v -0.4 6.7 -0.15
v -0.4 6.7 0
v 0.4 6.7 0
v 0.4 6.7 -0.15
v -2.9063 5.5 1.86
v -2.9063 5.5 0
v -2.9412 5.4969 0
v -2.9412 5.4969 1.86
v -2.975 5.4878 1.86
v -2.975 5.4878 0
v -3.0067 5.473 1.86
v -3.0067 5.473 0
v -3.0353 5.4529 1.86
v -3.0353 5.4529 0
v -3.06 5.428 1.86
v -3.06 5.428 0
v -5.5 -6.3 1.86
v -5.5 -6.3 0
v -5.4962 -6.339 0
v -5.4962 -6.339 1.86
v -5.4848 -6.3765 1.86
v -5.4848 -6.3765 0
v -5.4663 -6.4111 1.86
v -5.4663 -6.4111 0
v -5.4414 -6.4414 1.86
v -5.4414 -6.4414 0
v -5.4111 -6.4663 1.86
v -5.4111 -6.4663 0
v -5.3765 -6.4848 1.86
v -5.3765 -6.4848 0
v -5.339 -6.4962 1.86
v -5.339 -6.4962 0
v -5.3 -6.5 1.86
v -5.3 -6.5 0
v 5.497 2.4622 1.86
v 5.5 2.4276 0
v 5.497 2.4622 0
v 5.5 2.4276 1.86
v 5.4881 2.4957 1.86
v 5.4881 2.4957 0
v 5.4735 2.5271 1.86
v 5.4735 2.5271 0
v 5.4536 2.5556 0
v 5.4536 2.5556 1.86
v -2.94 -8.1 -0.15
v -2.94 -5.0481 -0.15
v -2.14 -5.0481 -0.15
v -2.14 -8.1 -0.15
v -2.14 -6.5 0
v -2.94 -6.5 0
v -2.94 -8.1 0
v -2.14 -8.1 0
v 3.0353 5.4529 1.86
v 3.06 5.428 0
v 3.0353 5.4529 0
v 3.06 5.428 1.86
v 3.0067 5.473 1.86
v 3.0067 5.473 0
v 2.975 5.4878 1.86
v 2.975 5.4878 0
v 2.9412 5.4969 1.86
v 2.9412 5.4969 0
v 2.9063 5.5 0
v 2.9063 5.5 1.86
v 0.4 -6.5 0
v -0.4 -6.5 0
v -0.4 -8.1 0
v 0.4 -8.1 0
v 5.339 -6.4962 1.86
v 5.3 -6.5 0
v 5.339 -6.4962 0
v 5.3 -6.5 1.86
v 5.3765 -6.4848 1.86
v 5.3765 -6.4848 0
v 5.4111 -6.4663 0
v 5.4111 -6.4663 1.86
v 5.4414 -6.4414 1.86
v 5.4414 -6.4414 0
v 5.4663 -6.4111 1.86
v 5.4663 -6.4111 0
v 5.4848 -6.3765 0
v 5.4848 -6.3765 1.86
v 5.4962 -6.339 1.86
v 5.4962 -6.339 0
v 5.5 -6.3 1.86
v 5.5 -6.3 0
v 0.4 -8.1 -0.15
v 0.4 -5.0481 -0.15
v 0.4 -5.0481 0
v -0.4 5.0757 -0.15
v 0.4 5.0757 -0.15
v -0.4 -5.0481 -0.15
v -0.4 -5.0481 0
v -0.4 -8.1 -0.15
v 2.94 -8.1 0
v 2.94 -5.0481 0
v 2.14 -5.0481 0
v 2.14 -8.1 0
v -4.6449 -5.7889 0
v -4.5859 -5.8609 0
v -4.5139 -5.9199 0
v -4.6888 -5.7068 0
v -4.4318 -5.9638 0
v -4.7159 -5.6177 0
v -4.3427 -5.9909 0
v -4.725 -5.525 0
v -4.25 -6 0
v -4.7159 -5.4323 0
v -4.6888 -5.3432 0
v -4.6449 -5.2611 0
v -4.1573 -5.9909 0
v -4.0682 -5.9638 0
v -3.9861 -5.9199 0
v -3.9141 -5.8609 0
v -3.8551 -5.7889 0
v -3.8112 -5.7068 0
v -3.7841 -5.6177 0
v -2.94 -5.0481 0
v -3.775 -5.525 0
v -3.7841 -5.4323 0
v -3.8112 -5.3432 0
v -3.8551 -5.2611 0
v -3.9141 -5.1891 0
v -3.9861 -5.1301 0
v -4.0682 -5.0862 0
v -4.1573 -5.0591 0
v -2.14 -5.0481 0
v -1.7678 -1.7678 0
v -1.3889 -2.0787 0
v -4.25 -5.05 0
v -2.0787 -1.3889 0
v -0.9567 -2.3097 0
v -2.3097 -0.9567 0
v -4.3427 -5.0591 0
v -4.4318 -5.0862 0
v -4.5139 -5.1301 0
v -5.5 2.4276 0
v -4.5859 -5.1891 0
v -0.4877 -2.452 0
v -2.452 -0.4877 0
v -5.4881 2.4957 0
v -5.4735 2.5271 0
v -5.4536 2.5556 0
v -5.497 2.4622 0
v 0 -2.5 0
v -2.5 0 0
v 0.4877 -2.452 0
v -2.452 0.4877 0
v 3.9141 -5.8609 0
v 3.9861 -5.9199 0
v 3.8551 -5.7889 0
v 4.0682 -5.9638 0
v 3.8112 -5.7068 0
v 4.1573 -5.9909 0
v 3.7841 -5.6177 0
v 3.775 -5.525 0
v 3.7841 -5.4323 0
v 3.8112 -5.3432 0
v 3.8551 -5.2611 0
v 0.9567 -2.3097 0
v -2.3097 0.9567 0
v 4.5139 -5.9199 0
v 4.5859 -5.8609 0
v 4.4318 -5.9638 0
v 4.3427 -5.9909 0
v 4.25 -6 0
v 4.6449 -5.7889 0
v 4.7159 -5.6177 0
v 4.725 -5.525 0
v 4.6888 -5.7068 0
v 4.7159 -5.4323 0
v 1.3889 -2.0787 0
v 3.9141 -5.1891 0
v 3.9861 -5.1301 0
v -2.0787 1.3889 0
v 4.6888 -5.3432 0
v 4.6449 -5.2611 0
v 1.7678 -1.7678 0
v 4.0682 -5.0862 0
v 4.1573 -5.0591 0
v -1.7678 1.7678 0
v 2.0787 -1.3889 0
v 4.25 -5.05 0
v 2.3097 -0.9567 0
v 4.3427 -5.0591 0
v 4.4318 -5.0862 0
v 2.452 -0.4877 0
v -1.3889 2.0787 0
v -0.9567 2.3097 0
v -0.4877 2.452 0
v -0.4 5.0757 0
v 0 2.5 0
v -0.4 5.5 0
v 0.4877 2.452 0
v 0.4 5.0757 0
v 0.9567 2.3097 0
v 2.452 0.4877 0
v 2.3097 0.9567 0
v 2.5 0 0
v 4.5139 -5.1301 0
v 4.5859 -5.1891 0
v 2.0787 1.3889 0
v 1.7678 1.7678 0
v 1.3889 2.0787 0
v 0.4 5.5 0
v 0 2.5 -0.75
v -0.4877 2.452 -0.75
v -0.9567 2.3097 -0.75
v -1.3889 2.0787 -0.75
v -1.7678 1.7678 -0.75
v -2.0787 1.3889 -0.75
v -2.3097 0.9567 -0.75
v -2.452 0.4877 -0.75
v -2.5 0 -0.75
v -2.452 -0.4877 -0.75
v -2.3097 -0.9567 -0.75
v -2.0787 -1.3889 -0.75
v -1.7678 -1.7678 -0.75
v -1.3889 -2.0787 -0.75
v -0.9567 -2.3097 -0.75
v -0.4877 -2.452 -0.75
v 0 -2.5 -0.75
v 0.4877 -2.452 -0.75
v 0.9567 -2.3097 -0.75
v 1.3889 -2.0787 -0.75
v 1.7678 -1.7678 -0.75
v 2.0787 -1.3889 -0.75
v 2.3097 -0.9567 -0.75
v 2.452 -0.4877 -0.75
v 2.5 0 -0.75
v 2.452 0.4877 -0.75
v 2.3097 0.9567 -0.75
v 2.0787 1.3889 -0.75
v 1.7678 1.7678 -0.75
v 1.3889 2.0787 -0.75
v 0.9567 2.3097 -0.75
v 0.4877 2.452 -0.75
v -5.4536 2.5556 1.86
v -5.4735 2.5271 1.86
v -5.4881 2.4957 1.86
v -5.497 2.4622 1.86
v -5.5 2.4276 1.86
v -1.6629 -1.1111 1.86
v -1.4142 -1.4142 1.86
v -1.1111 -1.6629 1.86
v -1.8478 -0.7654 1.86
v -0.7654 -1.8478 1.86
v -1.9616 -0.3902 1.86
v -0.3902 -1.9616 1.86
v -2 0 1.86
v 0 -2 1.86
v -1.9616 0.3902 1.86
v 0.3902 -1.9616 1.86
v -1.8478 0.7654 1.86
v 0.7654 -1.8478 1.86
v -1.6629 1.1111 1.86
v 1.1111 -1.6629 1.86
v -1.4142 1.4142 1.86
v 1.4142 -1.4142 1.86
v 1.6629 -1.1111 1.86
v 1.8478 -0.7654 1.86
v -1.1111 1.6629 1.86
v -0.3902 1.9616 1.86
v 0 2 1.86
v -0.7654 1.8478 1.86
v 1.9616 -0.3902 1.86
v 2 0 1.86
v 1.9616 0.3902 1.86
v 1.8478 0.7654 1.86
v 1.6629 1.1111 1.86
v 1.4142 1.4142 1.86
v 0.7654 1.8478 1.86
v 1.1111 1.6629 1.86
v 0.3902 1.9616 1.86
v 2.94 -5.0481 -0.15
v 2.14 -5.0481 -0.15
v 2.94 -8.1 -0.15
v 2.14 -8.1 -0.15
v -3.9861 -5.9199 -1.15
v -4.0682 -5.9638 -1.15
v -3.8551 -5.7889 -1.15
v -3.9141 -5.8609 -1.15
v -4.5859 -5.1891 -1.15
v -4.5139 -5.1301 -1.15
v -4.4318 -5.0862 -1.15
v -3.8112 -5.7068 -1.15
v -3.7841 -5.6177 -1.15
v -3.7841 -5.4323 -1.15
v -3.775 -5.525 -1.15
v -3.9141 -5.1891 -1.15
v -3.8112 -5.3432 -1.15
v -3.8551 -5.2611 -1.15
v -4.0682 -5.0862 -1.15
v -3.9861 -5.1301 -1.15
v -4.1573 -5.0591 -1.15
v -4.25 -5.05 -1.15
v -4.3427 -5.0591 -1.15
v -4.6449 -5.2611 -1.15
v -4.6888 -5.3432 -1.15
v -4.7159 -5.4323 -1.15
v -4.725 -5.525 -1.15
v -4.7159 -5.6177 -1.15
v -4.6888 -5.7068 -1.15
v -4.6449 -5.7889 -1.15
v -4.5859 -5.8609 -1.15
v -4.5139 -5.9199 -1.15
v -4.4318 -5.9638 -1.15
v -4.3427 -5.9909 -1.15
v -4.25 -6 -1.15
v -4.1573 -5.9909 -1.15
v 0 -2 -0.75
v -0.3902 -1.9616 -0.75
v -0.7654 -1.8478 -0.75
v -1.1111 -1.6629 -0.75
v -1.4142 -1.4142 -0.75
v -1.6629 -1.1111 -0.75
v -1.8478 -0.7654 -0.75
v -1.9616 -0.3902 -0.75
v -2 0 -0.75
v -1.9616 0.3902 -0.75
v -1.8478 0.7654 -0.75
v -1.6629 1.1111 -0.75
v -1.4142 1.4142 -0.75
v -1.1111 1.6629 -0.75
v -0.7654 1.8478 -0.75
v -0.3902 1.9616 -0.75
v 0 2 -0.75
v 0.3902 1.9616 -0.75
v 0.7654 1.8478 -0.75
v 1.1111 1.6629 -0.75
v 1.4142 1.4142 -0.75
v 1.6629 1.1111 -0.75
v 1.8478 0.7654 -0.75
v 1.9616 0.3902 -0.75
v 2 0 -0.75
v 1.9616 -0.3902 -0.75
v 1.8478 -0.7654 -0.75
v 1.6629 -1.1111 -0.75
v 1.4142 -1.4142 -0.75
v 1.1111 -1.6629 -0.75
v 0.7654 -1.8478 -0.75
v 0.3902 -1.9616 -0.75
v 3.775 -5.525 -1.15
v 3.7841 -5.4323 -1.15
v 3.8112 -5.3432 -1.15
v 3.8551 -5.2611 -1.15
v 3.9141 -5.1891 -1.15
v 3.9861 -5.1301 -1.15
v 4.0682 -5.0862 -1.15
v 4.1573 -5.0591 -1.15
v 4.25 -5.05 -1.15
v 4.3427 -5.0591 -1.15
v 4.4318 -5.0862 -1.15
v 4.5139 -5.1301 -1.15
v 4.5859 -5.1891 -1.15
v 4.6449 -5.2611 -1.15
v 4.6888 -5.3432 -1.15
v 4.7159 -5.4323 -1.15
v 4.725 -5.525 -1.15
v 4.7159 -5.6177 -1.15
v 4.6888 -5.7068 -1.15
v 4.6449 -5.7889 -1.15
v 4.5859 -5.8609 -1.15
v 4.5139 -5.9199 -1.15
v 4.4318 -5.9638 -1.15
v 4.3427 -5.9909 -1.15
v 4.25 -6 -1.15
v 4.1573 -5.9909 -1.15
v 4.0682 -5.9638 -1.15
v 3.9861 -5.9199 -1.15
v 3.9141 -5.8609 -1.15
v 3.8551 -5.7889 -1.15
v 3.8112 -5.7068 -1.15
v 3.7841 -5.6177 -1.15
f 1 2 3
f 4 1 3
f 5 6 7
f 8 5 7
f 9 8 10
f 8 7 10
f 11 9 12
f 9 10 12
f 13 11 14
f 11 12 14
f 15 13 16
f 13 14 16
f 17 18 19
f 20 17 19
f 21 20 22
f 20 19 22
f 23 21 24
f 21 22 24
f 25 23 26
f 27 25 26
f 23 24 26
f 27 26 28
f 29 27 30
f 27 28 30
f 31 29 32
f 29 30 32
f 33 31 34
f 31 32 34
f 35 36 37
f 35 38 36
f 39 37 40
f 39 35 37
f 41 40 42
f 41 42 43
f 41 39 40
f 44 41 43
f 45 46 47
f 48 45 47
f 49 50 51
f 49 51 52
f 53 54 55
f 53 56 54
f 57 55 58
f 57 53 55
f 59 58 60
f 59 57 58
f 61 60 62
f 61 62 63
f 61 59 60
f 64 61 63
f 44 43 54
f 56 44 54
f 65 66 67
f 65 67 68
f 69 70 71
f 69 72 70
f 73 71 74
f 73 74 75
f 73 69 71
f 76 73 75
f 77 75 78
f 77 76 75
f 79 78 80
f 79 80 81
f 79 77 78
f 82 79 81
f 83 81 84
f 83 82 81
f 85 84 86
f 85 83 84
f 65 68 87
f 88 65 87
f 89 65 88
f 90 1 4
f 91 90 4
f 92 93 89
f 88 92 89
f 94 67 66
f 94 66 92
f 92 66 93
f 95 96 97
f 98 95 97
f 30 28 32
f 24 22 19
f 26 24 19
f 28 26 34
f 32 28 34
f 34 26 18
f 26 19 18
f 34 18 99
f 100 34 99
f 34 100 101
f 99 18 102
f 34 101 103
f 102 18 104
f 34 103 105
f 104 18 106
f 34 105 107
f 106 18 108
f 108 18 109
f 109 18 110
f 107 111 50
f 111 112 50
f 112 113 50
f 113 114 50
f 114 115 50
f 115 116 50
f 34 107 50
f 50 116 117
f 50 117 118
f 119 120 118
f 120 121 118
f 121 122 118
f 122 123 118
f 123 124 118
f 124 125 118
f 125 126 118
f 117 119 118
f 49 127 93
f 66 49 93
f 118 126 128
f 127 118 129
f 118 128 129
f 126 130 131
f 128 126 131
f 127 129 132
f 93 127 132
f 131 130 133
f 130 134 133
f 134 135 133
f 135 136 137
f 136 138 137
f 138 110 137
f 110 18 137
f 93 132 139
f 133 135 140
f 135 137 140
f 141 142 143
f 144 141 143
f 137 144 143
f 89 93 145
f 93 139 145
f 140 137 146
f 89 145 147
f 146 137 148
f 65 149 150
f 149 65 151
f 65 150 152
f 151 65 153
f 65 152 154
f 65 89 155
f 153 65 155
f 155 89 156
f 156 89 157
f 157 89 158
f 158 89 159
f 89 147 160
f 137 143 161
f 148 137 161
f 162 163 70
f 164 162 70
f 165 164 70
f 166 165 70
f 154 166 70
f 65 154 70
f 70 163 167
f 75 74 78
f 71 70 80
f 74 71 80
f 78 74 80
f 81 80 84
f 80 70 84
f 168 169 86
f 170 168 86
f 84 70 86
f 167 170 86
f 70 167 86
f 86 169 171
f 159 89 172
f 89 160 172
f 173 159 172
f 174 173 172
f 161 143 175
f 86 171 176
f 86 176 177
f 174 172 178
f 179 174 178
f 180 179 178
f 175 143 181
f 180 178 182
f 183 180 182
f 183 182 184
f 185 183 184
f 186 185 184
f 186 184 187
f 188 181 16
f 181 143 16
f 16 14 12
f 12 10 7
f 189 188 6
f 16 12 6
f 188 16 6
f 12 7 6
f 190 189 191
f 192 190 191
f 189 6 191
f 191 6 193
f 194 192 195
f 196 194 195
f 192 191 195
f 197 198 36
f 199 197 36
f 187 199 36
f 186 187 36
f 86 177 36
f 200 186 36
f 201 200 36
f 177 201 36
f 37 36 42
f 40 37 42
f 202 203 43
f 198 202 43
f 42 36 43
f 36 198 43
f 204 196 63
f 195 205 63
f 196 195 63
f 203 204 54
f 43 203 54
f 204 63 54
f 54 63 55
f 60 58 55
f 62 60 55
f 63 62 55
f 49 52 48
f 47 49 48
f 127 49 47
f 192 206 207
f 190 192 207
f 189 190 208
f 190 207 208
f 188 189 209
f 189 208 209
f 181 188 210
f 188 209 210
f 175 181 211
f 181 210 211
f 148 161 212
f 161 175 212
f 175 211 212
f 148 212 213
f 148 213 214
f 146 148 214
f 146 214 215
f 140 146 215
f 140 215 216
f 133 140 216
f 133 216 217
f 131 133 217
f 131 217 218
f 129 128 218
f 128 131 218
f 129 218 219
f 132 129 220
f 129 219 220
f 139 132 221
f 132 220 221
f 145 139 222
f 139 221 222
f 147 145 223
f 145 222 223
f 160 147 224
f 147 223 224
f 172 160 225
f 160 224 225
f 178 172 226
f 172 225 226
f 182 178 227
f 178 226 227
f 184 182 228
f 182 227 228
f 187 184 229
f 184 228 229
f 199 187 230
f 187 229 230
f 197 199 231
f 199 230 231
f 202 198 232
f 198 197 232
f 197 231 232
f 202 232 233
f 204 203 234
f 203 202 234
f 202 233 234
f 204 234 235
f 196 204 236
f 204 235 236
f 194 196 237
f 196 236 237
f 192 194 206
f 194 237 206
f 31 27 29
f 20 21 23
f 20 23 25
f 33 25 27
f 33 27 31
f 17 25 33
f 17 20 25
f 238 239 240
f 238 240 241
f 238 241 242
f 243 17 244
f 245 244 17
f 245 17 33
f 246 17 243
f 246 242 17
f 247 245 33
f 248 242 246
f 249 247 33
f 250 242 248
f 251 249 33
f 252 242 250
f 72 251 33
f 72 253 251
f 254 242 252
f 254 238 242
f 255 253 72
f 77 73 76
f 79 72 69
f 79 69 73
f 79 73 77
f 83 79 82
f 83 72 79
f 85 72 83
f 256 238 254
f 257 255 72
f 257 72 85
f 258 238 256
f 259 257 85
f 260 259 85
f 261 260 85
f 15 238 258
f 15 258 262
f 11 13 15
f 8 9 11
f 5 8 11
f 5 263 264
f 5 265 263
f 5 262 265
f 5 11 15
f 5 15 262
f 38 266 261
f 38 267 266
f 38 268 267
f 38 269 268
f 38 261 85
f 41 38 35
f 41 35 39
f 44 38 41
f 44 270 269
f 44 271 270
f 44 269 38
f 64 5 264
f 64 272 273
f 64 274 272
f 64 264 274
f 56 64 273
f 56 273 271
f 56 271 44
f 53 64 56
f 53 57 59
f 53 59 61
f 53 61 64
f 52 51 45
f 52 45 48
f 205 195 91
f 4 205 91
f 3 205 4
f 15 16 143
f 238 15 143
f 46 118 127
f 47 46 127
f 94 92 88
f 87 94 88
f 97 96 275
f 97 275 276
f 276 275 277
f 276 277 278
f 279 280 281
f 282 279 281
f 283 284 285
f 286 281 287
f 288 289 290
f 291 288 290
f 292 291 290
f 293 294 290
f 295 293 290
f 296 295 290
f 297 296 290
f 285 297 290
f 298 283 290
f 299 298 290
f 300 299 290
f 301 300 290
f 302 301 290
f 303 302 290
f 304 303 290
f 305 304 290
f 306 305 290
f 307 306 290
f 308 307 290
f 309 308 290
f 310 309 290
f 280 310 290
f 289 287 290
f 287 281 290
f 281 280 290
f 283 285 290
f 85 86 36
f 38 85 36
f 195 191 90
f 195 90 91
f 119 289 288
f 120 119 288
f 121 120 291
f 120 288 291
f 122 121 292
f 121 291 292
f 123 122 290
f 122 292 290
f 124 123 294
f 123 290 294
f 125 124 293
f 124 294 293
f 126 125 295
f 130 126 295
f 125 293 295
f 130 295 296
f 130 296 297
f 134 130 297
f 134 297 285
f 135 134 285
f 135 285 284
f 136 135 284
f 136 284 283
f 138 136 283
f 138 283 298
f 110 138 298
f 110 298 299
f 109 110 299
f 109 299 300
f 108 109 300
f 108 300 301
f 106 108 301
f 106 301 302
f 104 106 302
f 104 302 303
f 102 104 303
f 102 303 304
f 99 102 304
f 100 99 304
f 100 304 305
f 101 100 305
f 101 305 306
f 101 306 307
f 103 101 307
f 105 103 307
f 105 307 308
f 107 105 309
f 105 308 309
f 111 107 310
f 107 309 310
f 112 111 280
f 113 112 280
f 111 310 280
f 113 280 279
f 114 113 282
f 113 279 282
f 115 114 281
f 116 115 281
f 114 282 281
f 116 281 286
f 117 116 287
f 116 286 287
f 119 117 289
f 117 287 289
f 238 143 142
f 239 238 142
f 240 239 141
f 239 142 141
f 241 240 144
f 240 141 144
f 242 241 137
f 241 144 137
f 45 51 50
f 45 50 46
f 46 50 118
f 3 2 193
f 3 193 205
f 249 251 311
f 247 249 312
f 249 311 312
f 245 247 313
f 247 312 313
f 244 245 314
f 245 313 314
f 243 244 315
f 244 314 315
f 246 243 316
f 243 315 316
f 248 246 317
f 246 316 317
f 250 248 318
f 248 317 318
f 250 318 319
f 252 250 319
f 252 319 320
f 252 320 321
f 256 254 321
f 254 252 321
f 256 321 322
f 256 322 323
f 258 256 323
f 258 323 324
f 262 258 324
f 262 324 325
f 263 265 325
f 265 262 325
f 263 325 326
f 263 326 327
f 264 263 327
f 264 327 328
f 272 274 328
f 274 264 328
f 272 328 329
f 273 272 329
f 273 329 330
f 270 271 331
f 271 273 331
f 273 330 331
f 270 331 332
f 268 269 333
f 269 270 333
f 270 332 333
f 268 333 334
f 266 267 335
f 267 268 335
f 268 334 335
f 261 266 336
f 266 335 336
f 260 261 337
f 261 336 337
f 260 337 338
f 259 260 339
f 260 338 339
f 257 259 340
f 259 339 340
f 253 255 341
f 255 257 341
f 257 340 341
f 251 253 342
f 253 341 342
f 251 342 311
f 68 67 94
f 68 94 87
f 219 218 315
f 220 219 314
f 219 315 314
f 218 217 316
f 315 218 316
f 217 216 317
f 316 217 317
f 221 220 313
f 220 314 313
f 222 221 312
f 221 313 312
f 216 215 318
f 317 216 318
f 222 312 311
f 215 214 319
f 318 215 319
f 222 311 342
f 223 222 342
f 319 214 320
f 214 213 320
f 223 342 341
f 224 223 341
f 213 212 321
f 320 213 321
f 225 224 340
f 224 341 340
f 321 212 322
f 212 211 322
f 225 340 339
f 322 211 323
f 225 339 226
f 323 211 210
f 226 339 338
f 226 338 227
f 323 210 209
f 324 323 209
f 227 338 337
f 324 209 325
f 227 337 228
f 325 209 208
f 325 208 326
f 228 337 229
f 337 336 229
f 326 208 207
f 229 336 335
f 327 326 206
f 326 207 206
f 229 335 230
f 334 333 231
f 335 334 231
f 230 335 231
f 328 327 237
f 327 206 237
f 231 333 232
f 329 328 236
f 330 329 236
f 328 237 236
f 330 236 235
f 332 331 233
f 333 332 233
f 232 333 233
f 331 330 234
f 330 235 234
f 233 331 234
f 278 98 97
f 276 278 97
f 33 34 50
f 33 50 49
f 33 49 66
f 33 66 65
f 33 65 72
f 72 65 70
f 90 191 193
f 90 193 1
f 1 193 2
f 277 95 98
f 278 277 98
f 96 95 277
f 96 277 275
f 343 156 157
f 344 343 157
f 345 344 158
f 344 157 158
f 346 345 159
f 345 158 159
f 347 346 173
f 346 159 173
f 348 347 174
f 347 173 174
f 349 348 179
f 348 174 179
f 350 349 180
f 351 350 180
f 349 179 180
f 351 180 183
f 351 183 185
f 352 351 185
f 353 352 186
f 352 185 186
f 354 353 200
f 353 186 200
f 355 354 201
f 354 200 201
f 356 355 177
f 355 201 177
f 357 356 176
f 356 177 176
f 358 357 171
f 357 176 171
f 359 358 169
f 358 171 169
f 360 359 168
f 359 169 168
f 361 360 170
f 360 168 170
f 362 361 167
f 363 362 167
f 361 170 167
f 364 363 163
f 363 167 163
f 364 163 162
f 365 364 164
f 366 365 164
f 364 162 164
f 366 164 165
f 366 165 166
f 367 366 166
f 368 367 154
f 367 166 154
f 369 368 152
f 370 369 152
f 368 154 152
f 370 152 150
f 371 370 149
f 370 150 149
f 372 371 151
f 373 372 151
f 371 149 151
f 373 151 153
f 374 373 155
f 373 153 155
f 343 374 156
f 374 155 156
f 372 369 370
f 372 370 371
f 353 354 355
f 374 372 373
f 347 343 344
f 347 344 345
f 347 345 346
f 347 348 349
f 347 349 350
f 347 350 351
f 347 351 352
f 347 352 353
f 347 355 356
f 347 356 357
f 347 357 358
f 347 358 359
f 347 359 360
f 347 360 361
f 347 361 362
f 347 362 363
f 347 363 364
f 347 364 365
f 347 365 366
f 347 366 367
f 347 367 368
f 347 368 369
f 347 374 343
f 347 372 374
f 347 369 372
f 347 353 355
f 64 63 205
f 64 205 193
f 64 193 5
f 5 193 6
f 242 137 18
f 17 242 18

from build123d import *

# Parameters (mm, degrees)
SALIENTE_EXTRUIR1_DEPTH   = 1.86
CROQUIS2_R                = 0.475
SALIENTE_EXTRUIR2_DEPTH   = 1.15
SALIENTE_EXTRUIR3_START   = 0.75
SALIENTE_EXTRUIR3_DEPTH   = 0.75
CROQUIS4_W                = 0.4
CROQUIS4_H                = 1.624344129
SALIENTE_EXTRUIR4_DEPTH   = 0.15
CROQUIS4_W_2              = 0.8
CROQUIS4_H_2              = 3.051904831
SALIENTE_EXTRUIR4_2_DEPTH = 0.15
SALIENTE_EXTRUIR4_3_DEPTH = 0.15
REDONDEO1_R               = 0.2
SIMETR_A1_DEPTH           = 1.86
SIMETR_A1_START           = -0.75
SIMETR_A1_2_OUTLINE_R     = 0.475
SIMETR_A1_2_DEPTH         = 0.75
SIMETR_A1_START_2         = -1.15
SIMETR_A1_3_OUTLINE_R     = 0.475
SIMETR_A1_3_DEPTH         = 0.4


# Read off the part's stored shape, not the designer's step: Simetría1
with BuildPart() as part:
    # Croquis1 → Saliente-Extruir1 (new body)
    with BuildSketch(Plane.XY):
        with BuildLine():
            Line((5.5, -6.5), (5.5, 2.5))
            Line((5.5, 2.5), (3, 5.5))
            Line((3, 5.5), (0, 5.5))
            Line((0, 5.5), (0, 2))
            ThreePointArc((0, 2), (2, 0), (0, -2))
            Line((0, -2), (0, -6.5))
            Line((0, -6.5), (5.5, -6.5))
        make_face()
    extrude(amount=SALIENTE_EXTRUIR1_DEPTH)

    # Croquis2 → Saliente-Extruir2 (add)
    with BuildSketch(Plane(origin=(0, 0, 0), x_dir=(-1, 0, 0), z_dir=(0, 0, -1))):
        with Locations((-4.25, -5.525)):
            Circle(CROQUIS2_R)
    extrude(amount=SALIENTE_EXTRUIR2_DEPTH)

    # Croquis3 → Saliente-Extruir3 (add)
    with BuildSketch(Plane(origin=(0, 0, 0), x_dir=(-1, 0, 0), z_dir=(0, 0, -1)).offset(SALIENTE_EXTRUIR3_START)):
        with BuildLine():
            Line((0, 2.5), (0, 2))
            ThreePointArc((0, 2), (-2, 0), (0, -2))
            Line((0, -2), (0, -2.5))
            ThreePointArc((0, -2.5), (-2.5, 0), (0, 2.5))
        make_face()
    extrude(amount=-SALIENTE_EXTRUIR3_DEPTH)

    # Redondeo1
    redondeo1_edges = [part.edges().sort_by_distance(p)[0] for p in [
        (3, 5.5, 0.93),
        (5.5, 2.5, 0.93),
        (5.5, -6.5, 0.93),
    ]]
    fillet(redondeo1_edges, radius=REDONDEO1_R)

    # Simetría1 outline → Simetría1 (add)
    with BuildSketch(Plane.XY):
        with BuildLine():
            ThreePointArc((0, -2), (-2, 0), (0, 2))
            Line((0, 2), (0, 5.5))
            Line((0, 5.5), (-2.906325011, 5.5))
            ThreePointArc((-2.906325011, 5.5), (-2.99115609, 5.481117884), (-3.059969267, 5.42803688))
            Line((-3.059969267, 5.42803688), (-5.453644256, 2.555626893))
            ThreePointArc((-5.453644256, 2.555626893), (-5.488054316, 2.495675066), (-5.5, 2.427590013))
            Line((-5.5, 2.427590013), (-5.5, -6.3))
            ThreePointArc((-5.5, -6.3), (-5.441421356, -6.441421356), (-5.3, -6.5))
            Line((-5.3, -6.5), (0, -6.5))
            Line((0, -6.5), (0, -2))
        make_face()
    extrude(amount=SIMETR_A1_DEPTH)

    # Simetr_a1 2 outline → Simetr_a1 2 (add)
    with BuildSketch(Plane.XY.offset(SIMETR_A1_START)):
        with BuildLine():
            ThreePointArc((0, -2), (-2, 0), (0, 2))
            Line((0, 2), (0, 2.5))
            ThreePointArc((0, 2.5), (-2.5, 0), (0, -2.5))
            Line((0, -2.5), (0, -2))
        make_face()
        with Locations((-4.25, -5.525)):
            Circle(SIMETR_A1_2_OUTLINE_R)
    extrude(amount=SIMETR_A1_2_DEPTH)

    # Simetr_a1 3 outline → Simetr_a1 3 (add)
    with BuildSketch(Plane.XY.offset(SIMETR_A1_START_2)):
        with Locations((-4.25, -5.525)):
            Circle(SIMETR_A1_3_OUTLINE_R)
    extrude(amount=SIMETR_A1_3_DEPTH)


with BuildPart() as body_2:
    # Croquis4 → Saliente-Extruir4 (new body)
    with BuildSketch(Plane(origin=(0, 0, 0), x_dir=(-1, 0, 0), z_dir=(0, 0, -1))):
        with Locations((-0.2, 5.887827936)):
            Rectangle(CROQUIS4_W, CROQUIS4_H)
    saliente_extruir4 = extrude(amount=SALIENTE_EXTRUIR4_DEPTH)


with BuildPart() as body_3:
    # Croquis4 → Saliente-Extruir4 2 (new body)
    with BuildSketch(Plane(origin=(0, 0, 0), x_dir=(-1, 0, 0), z_dir=(0, 0, -1))):
        with Locations((-2.54, -6.574047585)):
            Rectangle(CROQUIS4_W_2, CROQUIS4_H_2)
    saliente_extruir4_2 = extrude(amount=SALIENTE_EXTRUIR4_2_DEPTH)


with BuildPart() as body_4:
    # Croquis4 → Saliente-Extruir4 3 (new body)
    with BuildSketch(Plane(origin=(0, 0, 0), x_dir=(-1, 0, 0), z_dir=(0, 0, -1))):
        with Locations((-0.2, -6.574047585)):
            Rectangle(CROQUIS4_W, CROQUIS4_H_2)
    saliente_extruir4_3 = extrude(amount=SALIENTE_EXTRUIR4_3_DEPTH)


with BuildPart() as part_1:
    add(part.part)

    add(body_2.part)  # Simetría2 merges body 2

    add(body_4.part)  # Simetría2 merges body 4
    # Simetría2: Saliente-Extruir4, Saliente-Extruir4 2, Saliente-Extruir4 3 across plane
    add(saliente_extruir4.mirror(Plane(origin=(0, 0, 0), x_dir=(0, 0, 1), z_dir=(1, 0, 0))))
    add(saliente_extruir4_2.mirror(Plane(origin=(0, 0, 0), x_dir=(0, 0, 1), z_dir=(1, 0, 0))))
    add(saliente_extruir4_3.mirror(Plane(origin=(0, 0, 0), x_dir=(0, 0, 1), z_dir=(1, 0, 0))))


solid = Compound([body_3.part, part_1.part])
